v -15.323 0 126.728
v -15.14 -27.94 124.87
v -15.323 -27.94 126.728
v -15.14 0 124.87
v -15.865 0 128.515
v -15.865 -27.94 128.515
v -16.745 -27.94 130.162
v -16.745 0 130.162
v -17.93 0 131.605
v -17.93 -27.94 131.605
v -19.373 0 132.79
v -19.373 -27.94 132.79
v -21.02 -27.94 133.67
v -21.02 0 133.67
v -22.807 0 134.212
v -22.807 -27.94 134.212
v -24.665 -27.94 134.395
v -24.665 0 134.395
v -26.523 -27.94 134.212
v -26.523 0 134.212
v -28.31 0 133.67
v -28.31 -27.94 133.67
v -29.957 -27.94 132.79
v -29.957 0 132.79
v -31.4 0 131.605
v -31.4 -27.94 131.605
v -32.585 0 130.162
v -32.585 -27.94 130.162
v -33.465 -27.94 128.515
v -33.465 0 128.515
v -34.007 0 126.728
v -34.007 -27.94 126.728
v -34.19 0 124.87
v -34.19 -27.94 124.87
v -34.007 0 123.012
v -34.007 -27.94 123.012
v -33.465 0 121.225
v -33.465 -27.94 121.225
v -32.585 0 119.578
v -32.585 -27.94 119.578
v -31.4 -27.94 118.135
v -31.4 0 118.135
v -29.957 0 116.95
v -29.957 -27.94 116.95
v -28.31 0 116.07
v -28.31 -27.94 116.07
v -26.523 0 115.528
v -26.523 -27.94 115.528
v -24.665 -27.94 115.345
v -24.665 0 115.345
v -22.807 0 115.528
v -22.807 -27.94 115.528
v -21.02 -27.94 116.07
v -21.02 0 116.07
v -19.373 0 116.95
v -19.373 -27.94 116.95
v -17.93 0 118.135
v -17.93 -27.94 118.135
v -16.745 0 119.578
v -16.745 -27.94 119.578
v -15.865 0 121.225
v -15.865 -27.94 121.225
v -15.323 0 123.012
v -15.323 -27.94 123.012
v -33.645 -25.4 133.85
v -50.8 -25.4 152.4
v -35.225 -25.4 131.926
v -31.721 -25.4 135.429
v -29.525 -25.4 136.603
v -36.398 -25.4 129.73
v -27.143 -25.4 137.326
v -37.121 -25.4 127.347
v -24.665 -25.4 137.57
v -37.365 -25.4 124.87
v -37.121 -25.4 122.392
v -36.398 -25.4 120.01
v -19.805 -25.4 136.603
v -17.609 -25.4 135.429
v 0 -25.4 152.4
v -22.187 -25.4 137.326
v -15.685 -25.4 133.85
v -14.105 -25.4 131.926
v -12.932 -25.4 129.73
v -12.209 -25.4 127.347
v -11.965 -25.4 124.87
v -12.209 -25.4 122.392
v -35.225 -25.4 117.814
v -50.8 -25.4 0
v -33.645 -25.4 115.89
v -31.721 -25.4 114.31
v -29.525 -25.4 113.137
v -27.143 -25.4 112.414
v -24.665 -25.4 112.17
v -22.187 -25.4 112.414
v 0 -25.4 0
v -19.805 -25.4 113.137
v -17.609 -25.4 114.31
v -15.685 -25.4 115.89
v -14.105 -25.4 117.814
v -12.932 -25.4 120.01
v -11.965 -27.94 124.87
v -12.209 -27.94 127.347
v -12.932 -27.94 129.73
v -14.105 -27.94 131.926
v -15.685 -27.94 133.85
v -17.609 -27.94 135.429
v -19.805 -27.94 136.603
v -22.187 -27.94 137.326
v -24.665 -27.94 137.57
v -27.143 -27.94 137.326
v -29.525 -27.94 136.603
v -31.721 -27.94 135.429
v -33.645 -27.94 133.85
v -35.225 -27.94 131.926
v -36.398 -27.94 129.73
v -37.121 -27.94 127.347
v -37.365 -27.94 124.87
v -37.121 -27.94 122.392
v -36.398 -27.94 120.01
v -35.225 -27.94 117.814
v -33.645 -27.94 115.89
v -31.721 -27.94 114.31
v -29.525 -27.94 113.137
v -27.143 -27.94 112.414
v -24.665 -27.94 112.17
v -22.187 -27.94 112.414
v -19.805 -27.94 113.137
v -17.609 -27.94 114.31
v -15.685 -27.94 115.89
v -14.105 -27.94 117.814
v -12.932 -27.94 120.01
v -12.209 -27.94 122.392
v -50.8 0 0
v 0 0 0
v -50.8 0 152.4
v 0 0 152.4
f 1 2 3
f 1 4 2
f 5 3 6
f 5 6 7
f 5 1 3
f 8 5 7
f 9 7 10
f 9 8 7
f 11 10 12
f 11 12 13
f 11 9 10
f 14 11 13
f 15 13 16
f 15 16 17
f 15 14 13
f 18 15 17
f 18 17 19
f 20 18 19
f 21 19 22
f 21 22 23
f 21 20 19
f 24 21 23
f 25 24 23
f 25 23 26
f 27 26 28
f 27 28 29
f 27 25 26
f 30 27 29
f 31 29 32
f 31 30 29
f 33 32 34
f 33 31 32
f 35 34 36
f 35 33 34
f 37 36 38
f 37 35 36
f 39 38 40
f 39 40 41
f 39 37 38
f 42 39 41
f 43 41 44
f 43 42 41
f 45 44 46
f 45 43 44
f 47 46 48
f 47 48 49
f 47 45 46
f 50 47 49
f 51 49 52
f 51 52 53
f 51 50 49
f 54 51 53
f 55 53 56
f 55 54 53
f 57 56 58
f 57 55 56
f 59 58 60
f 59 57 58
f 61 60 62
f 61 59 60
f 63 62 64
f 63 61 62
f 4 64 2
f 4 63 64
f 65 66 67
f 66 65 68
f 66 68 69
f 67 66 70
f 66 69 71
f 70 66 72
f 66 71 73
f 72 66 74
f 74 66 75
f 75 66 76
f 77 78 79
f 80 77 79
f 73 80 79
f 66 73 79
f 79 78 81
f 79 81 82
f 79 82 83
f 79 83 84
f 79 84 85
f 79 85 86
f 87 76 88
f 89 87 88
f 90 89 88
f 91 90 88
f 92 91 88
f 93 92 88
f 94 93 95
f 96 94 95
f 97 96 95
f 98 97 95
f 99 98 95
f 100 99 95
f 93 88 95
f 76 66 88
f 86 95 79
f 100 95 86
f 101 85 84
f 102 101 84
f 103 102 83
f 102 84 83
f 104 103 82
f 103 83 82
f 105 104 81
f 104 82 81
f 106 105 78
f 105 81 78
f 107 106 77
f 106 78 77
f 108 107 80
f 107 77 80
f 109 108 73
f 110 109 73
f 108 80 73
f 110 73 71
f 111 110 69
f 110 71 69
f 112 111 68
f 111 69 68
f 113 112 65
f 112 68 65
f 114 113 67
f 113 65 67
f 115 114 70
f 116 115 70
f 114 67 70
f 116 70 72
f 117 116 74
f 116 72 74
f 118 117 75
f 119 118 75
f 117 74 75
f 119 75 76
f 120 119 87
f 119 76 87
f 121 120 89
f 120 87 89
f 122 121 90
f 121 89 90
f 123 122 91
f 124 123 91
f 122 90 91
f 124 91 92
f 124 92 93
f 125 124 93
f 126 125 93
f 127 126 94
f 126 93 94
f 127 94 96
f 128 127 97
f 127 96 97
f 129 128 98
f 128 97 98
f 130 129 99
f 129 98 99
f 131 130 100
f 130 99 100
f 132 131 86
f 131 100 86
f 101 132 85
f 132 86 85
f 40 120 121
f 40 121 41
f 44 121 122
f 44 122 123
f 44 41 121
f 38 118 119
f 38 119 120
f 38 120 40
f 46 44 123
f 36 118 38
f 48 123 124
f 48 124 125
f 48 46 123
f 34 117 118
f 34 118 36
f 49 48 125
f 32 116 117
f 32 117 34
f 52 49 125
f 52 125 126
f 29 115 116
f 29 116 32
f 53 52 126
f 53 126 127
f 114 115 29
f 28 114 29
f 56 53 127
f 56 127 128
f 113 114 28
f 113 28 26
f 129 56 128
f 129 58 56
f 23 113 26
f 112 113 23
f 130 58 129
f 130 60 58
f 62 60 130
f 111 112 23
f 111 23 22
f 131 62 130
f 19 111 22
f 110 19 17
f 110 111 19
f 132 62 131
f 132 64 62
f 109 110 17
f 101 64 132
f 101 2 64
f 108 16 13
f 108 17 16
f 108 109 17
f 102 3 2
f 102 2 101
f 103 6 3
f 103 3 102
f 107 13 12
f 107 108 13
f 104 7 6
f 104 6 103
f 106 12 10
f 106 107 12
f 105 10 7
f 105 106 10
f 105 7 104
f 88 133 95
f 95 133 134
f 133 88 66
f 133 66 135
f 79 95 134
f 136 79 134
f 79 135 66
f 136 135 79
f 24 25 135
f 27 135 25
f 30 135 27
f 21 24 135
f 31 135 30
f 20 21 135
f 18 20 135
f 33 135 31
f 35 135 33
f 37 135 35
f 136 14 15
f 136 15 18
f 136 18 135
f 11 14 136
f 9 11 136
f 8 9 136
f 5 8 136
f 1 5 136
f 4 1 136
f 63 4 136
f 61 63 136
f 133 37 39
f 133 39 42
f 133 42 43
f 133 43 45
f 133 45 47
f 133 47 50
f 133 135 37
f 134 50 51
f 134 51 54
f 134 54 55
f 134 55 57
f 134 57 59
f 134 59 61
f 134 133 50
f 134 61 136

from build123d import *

# Parameters (mm, degrees)
F0_W     = 50.8
F0_H     = 25.4
F1_DEPTH = 152.4
F2_R     = 9.525
F3_DEPTH = 25.4
F4_R     = 12.7
F4_R_2   = 9.525
F5_DEPTH = 2.54


with BuildPart() as f1:
    # F0 (on Top) → F1 (new body)
    with BuildSketch(Plane.XY):
        with Locations((-25.4, -12.7)):
            Rectangle(F0_W, F0_H)
    extrude(amount=F1_DEPTH)

    # F2 (on face) → F3 (cut)
    with BuildSketch(Plane.XZ.offset(25.4)):
        with Locations((-24.664951, 124.869779)):
            Circle(F2_R)
    extrude(amount=-F3_DEPTH, mode=Mode.SUBTRACT)

    # F4 (on face) → F5 (join)
    with BuildSketch(Plane.XZ.offset(25.4)):
        with Locations((-24.664951, 124.869779)):
            Circle(F4_R)
        with Locations((-24.664951, 124.869779)):
            Circle(F4_R_2, mode=Mode.SUBTRACT)
    extrude(amount=F5_DEPTH)


solid = f1.part
